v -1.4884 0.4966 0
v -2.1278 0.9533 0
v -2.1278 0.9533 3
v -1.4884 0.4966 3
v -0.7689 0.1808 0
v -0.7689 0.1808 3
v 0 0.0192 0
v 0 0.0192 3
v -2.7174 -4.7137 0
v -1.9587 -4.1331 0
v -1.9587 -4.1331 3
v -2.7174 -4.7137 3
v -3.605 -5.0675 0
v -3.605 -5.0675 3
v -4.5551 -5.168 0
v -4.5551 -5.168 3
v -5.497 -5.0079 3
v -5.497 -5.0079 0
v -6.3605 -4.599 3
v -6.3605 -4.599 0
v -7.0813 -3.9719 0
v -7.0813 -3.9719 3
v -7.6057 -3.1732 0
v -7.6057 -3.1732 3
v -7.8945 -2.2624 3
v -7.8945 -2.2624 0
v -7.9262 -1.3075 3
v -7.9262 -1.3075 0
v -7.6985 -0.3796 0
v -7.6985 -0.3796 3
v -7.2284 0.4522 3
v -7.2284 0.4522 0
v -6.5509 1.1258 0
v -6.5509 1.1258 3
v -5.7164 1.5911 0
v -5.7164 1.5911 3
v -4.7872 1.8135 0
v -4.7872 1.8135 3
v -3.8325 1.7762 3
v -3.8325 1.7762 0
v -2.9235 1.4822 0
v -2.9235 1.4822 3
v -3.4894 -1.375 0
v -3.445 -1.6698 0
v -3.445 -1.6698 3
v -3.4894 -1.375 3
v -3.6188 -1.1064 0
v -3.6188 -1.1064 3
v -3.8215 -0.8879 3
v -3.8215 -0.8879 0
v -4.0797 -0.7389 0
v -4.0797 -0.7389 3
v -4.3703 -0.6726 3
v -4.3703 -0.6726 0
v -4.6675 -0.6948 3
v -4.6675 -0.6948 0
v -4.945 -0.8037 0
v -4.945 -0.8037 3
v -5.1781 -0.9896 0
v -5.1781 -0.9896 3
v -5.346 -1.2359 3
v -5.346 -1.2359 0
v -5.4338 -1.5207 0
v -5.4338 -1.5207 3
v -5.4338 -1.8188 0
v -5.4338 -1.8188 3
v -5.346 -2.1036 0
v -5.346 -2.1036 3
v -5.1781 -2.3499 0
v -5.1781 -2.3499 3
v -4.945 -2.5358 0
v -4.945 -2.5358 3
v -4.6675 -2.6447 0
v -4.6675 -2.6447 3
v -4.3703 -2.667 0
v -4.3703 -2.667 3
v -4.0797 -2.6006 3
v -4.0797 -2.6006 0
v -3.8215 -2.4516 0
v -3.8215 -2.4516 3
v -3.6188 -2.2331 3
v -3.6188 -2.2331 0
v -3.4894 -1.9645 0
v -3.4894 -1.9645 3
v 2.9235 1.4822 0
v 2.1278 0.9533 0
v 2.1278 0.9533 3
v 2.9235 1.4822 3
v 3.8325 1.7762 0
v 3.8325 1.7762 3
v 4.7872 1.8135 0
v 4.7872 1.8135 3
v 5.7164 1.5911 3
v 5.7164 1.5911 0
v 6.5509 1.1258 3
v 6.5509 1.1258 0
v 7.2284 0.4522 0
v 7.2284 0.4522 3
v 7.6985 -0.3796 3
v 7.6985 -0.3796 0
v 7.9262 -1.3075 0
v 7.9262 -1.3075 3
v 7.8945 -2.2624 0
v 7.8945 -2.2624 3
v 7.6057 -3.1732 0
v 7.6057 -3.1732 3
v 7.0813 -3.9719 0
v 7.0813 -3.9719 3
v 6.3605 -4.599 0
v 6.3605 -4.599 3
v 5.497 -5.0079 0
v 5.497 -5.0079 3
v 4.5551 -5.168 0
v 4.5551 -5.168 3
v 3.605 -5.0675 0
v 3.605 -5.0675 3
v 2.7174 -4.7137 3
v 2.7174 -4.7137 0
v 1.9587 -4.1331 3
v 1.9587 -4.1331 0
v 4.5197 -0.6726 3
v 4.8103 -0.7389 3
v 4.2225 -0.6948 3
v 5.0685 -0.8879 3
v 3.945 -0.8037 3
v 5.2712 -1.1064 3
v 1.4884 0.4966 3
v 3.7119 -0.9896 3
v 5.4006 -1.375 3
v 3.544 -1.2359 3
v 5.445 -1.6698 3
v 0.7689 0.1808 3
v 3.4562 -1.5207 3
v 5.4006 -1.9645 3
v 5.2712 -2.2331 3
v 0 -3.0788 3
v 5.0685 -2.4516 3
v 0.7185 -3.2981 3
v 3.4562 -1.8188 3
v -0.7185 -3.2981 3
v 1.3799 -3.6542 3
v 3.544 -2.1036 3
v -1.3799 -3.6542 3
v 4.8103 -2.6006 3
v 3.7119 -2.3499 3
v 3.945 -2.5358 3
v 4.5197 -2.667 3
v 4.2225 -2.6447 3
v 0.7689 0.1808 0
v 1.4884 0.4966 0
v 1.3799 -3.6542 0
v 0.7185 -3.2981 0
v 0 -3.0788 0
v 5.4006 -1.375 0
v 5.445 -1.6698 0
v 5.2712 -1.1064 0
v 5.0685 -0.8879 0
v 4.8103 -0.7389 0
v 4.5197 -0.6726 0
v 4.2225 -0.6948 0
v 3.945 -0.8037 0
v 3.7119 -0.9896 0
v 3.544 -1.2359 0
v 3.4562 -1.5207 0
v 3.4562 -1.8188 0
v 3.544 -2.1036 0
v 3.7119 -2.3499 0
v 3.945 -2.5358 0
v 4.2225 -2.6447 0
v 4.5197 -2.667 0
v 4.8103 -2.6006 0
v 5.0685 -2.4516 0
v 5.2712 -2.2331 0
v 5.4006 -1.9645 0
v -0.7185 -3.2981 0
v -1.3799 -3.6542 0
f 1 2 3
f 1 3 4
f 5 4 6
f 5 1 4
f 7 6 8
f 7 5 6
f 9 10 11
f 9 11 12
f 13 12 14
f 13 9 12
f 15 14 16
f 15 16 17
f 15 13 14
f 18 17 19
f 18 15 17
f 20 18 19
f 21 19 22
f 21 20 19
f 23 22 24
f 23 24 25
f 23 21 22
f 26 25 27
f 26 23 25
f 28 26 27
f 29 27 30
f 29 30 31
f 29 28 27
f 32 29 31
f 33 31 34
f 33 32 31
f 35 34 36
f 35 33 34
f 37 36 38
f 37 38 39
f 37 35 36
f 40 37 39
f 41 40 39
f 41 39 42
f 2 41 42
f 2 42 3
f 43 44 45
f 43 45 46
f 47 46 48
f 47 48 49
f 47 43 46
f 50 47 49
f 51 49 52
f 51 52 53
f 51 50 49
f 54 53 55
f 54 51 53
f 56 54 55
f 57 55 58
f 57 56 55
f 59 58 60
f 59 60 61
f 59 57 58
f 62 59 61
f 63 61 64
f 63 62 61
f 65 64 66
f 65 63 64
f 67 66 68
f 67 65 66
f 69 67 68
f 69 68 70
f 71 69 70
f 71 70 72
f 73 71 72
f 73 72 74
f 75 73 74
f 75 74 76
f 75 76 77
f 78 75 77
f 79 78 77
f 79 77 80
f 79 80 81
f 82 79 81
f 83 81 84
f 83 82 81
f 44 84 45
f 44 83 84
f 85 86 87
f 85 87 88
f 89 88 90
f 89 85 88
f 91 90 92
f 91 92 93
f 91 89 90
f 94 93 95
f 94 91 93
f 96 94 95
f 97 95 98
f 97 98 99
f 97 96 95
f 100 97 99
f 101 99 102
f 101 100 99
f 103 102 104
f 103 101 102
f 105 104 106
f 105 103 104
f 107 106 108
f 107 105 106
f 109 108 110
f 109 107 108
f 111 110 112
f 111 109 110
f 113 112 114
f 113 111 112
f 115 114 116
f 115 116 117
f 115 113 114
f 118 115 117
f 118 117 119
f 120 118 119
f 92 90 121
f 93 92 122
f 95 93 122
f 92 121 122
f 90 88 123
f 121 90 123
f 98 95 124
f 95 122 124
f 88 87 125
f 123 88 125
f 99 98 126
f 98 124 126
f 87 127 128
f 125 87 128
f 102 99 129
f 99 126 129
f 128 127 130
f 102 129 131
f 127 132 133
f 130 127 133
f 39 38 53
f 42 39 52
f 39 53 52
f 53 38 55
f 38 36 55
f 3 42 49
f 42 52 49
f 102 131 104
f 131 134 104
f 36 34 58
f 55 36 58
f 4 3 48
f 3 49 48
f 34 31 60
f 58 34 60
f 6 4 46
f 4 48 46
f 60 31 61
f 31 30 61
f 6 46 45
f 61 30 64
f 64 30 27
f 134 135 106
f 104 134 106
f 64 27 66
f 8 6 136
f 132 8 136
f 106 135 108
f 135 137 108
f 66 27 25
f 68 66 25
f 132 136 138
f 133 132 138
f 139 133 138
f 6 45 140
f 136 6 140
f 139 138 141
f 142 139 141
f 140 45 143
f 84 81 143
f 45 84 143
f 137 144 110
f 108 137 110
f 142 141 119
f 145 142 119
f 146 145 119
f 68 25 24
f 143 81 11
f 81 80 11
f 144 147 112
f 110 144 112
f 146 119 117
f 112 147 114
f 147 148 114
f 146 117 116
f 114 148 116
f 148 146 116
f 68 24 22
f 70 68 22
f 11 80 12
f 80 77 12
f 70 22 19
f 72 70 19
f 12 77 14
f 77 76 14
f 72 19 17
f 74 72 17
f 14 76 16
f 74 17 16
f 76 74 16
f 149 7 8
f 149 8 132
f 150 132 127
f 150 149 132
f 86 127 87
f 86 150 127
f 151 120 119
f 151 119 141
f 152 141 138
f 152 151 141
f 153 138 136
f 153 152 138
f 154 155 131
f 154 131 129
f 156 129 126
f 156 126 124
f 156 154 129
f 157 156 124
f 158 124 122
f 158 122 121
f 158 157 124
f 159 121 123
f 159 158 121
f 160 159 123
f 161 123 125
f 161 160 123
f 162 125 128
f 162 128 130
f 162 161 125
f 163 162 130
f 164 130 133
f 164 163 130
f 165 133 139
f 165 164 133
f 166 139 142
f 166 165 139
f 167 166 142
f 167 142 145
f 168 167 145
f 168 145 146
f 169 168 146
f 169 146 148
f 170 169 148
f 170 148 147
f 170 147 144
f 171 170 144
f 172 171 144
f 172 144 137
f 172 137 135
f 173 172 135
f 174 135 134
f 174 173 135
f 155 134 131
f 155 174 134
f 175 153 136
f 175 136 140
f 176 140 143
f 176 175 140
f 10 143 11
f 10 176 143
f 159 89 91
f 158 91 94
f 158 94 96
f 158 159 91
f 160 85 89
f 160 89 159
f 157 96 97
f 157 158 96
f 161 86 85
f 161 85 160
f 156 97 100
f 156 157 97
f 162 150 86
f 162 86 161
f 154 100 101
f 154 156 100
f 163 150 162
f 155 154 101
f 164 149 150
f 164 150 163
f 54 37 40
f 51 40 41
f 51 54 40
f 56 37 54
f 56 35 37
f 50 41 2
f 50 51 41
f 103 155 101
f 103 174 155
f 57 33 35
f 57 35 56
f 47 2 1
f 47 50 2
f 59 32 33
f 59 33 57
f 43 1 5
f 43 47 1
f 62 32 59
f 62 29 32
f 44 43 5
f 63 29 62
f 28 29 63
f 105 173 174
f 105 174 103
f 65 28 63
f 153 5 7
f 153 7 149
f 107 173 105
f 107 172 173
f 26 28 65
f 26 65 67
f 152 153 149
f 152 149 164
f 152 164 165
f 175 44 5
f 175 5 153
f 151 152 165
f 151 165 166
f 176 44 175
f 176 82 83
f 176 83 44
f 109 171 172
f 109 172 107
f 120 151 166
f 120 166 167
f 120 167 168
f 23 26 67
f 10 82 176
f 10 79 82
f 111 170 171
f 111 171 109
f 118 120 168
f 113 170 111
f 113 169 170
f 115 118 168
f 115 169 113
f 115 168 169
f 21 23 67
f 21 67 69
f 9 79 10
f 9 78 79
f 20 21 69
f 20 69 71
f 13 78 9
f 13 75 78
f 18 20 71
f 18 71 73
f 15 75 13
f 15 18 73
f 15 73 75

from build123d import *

# Parameters (mm, degrees)
SKETCH_1_R      = 1
EXTRUDE_1_DEPTH = 3
FILLET_1_R      = 3.81


with BuildPart() as part:
    # 스케치1 → 보스-돌출1 (new body)
    with BuildSketch(Plane.XY):
        with BuildLine():
            ThreePointArc((1.360143251, -0.016380398), (7.940783027, -1.841517038), (1.212921566, -3.01276585))
            ThreePointArc((1.212921566, -3.01276585), (0, -2.999009296), (-1.212921566, -3.01276585))
            ThreePointArc((-1.212921566, -3.01276585), (-7.940783027, -1.841517038), (-1.360143251, -0.016380398))
            ThreePointArc((-1.360143251, -0.016380398), (0, 0), (1.360143251, -0.016380398))
        make_face()
        with Locations((-4.445, -1.669758406)):
            Circle(SKETCH_1_R, mode=Mode.SUBTRACT)
        with Locations((4.445, -1.669758406)):
            Circle(SKETCH_1_R, mode=Mode.SUBTRACT)
    extrude(amount=EXTRUDE_1_DEPTH)

    # 필렛1
    # the kernel refuses this fillet: 3.81 mm, written as the material it adds along each edge
    with BuildSketch(Plane(origin=(1.212921566, -3.01276585, 0), x_dir=(0.5541029817307234, -0.8324481278957396, 0), z_dir=(0, 0, 1))) as fillet_1_piece_1:
        with BuildLine():
            CenterArc((2.078362303, -3.73891854), FILLET_1_R, 101.084875911, 46.128957788)
            ThreePointArc((-1.12469468, -1.675783557), (-0.570253257, -0.832585758), (0, 0))
            ThreePointArc((0, 0), (0.672920265, -0.065297929), (1.345840529, 0))
        make_face()
    extrude(amount=3)
    with BuildSketch(Plane(origin=(-1.212921566, -3.01276585, 0), x_dir=(-0.5541029817307197, -0.8324481278957422, 0), z_dir=(0, 0, 1))) as fillet_1_piece_2:
        with BuildLine():
            CenterArc((2.078362303, 3.73891854), FILLET_1_R, 212.786166302, 46.128957788)
            ThreePointArc((-1.12469468, 1.675783557), (-0.570253257, 0.832585758), (0, 0))
            ThreePointArc((0, 0), (0.672920265, 0.065297929), (1.345840529, 0))
        make_face()
    extrude(amount=3)
    with BuildSketch(Plane(origin=(1.360143251, -0.016380398, 0), x_dir=(-0.9999615504987989, 0.008769123333507087, 0), z_dir=(0, 0, 1))) as fillet_1_piece_3:
        with BuildLine():
            CenterArc((1.788298707, -3.809553141), FILLET_1_R, 90.877535516, 41.082301134)
            ThreePointArc((-0.759103528, -0.976384975), (-0.336083058, -0.521987813), (0, 0))
            ThreePointArc((0, 0), (0.864973735, -0.006624048), (1.72994747, 0))
        make_face()
    extrude(amount=3)
    with BuildSketch(Plane(origin=(-1.360143251, -0.016380398, 0), x_dir=(-0.6206853131175095, 0.7840597822106544, 0), z_dir=(0, 0, 1))) as fillet_1_piece_4:
        with BuildLine():
            CenterArc((1.909904861, -3.750062775), FILLET_1_R, 100.176406591, 41.082301134)
            ThreePointArc((-1.061817419, -1.365745957), (-0.525679205, -0.686938726), (0, 0))
            ThreePointArc((0, 0), (0.618378077, -0.055060443), (1.236756154, 0))
        make_face()
    extrude(amount=3)


solid = part.part
